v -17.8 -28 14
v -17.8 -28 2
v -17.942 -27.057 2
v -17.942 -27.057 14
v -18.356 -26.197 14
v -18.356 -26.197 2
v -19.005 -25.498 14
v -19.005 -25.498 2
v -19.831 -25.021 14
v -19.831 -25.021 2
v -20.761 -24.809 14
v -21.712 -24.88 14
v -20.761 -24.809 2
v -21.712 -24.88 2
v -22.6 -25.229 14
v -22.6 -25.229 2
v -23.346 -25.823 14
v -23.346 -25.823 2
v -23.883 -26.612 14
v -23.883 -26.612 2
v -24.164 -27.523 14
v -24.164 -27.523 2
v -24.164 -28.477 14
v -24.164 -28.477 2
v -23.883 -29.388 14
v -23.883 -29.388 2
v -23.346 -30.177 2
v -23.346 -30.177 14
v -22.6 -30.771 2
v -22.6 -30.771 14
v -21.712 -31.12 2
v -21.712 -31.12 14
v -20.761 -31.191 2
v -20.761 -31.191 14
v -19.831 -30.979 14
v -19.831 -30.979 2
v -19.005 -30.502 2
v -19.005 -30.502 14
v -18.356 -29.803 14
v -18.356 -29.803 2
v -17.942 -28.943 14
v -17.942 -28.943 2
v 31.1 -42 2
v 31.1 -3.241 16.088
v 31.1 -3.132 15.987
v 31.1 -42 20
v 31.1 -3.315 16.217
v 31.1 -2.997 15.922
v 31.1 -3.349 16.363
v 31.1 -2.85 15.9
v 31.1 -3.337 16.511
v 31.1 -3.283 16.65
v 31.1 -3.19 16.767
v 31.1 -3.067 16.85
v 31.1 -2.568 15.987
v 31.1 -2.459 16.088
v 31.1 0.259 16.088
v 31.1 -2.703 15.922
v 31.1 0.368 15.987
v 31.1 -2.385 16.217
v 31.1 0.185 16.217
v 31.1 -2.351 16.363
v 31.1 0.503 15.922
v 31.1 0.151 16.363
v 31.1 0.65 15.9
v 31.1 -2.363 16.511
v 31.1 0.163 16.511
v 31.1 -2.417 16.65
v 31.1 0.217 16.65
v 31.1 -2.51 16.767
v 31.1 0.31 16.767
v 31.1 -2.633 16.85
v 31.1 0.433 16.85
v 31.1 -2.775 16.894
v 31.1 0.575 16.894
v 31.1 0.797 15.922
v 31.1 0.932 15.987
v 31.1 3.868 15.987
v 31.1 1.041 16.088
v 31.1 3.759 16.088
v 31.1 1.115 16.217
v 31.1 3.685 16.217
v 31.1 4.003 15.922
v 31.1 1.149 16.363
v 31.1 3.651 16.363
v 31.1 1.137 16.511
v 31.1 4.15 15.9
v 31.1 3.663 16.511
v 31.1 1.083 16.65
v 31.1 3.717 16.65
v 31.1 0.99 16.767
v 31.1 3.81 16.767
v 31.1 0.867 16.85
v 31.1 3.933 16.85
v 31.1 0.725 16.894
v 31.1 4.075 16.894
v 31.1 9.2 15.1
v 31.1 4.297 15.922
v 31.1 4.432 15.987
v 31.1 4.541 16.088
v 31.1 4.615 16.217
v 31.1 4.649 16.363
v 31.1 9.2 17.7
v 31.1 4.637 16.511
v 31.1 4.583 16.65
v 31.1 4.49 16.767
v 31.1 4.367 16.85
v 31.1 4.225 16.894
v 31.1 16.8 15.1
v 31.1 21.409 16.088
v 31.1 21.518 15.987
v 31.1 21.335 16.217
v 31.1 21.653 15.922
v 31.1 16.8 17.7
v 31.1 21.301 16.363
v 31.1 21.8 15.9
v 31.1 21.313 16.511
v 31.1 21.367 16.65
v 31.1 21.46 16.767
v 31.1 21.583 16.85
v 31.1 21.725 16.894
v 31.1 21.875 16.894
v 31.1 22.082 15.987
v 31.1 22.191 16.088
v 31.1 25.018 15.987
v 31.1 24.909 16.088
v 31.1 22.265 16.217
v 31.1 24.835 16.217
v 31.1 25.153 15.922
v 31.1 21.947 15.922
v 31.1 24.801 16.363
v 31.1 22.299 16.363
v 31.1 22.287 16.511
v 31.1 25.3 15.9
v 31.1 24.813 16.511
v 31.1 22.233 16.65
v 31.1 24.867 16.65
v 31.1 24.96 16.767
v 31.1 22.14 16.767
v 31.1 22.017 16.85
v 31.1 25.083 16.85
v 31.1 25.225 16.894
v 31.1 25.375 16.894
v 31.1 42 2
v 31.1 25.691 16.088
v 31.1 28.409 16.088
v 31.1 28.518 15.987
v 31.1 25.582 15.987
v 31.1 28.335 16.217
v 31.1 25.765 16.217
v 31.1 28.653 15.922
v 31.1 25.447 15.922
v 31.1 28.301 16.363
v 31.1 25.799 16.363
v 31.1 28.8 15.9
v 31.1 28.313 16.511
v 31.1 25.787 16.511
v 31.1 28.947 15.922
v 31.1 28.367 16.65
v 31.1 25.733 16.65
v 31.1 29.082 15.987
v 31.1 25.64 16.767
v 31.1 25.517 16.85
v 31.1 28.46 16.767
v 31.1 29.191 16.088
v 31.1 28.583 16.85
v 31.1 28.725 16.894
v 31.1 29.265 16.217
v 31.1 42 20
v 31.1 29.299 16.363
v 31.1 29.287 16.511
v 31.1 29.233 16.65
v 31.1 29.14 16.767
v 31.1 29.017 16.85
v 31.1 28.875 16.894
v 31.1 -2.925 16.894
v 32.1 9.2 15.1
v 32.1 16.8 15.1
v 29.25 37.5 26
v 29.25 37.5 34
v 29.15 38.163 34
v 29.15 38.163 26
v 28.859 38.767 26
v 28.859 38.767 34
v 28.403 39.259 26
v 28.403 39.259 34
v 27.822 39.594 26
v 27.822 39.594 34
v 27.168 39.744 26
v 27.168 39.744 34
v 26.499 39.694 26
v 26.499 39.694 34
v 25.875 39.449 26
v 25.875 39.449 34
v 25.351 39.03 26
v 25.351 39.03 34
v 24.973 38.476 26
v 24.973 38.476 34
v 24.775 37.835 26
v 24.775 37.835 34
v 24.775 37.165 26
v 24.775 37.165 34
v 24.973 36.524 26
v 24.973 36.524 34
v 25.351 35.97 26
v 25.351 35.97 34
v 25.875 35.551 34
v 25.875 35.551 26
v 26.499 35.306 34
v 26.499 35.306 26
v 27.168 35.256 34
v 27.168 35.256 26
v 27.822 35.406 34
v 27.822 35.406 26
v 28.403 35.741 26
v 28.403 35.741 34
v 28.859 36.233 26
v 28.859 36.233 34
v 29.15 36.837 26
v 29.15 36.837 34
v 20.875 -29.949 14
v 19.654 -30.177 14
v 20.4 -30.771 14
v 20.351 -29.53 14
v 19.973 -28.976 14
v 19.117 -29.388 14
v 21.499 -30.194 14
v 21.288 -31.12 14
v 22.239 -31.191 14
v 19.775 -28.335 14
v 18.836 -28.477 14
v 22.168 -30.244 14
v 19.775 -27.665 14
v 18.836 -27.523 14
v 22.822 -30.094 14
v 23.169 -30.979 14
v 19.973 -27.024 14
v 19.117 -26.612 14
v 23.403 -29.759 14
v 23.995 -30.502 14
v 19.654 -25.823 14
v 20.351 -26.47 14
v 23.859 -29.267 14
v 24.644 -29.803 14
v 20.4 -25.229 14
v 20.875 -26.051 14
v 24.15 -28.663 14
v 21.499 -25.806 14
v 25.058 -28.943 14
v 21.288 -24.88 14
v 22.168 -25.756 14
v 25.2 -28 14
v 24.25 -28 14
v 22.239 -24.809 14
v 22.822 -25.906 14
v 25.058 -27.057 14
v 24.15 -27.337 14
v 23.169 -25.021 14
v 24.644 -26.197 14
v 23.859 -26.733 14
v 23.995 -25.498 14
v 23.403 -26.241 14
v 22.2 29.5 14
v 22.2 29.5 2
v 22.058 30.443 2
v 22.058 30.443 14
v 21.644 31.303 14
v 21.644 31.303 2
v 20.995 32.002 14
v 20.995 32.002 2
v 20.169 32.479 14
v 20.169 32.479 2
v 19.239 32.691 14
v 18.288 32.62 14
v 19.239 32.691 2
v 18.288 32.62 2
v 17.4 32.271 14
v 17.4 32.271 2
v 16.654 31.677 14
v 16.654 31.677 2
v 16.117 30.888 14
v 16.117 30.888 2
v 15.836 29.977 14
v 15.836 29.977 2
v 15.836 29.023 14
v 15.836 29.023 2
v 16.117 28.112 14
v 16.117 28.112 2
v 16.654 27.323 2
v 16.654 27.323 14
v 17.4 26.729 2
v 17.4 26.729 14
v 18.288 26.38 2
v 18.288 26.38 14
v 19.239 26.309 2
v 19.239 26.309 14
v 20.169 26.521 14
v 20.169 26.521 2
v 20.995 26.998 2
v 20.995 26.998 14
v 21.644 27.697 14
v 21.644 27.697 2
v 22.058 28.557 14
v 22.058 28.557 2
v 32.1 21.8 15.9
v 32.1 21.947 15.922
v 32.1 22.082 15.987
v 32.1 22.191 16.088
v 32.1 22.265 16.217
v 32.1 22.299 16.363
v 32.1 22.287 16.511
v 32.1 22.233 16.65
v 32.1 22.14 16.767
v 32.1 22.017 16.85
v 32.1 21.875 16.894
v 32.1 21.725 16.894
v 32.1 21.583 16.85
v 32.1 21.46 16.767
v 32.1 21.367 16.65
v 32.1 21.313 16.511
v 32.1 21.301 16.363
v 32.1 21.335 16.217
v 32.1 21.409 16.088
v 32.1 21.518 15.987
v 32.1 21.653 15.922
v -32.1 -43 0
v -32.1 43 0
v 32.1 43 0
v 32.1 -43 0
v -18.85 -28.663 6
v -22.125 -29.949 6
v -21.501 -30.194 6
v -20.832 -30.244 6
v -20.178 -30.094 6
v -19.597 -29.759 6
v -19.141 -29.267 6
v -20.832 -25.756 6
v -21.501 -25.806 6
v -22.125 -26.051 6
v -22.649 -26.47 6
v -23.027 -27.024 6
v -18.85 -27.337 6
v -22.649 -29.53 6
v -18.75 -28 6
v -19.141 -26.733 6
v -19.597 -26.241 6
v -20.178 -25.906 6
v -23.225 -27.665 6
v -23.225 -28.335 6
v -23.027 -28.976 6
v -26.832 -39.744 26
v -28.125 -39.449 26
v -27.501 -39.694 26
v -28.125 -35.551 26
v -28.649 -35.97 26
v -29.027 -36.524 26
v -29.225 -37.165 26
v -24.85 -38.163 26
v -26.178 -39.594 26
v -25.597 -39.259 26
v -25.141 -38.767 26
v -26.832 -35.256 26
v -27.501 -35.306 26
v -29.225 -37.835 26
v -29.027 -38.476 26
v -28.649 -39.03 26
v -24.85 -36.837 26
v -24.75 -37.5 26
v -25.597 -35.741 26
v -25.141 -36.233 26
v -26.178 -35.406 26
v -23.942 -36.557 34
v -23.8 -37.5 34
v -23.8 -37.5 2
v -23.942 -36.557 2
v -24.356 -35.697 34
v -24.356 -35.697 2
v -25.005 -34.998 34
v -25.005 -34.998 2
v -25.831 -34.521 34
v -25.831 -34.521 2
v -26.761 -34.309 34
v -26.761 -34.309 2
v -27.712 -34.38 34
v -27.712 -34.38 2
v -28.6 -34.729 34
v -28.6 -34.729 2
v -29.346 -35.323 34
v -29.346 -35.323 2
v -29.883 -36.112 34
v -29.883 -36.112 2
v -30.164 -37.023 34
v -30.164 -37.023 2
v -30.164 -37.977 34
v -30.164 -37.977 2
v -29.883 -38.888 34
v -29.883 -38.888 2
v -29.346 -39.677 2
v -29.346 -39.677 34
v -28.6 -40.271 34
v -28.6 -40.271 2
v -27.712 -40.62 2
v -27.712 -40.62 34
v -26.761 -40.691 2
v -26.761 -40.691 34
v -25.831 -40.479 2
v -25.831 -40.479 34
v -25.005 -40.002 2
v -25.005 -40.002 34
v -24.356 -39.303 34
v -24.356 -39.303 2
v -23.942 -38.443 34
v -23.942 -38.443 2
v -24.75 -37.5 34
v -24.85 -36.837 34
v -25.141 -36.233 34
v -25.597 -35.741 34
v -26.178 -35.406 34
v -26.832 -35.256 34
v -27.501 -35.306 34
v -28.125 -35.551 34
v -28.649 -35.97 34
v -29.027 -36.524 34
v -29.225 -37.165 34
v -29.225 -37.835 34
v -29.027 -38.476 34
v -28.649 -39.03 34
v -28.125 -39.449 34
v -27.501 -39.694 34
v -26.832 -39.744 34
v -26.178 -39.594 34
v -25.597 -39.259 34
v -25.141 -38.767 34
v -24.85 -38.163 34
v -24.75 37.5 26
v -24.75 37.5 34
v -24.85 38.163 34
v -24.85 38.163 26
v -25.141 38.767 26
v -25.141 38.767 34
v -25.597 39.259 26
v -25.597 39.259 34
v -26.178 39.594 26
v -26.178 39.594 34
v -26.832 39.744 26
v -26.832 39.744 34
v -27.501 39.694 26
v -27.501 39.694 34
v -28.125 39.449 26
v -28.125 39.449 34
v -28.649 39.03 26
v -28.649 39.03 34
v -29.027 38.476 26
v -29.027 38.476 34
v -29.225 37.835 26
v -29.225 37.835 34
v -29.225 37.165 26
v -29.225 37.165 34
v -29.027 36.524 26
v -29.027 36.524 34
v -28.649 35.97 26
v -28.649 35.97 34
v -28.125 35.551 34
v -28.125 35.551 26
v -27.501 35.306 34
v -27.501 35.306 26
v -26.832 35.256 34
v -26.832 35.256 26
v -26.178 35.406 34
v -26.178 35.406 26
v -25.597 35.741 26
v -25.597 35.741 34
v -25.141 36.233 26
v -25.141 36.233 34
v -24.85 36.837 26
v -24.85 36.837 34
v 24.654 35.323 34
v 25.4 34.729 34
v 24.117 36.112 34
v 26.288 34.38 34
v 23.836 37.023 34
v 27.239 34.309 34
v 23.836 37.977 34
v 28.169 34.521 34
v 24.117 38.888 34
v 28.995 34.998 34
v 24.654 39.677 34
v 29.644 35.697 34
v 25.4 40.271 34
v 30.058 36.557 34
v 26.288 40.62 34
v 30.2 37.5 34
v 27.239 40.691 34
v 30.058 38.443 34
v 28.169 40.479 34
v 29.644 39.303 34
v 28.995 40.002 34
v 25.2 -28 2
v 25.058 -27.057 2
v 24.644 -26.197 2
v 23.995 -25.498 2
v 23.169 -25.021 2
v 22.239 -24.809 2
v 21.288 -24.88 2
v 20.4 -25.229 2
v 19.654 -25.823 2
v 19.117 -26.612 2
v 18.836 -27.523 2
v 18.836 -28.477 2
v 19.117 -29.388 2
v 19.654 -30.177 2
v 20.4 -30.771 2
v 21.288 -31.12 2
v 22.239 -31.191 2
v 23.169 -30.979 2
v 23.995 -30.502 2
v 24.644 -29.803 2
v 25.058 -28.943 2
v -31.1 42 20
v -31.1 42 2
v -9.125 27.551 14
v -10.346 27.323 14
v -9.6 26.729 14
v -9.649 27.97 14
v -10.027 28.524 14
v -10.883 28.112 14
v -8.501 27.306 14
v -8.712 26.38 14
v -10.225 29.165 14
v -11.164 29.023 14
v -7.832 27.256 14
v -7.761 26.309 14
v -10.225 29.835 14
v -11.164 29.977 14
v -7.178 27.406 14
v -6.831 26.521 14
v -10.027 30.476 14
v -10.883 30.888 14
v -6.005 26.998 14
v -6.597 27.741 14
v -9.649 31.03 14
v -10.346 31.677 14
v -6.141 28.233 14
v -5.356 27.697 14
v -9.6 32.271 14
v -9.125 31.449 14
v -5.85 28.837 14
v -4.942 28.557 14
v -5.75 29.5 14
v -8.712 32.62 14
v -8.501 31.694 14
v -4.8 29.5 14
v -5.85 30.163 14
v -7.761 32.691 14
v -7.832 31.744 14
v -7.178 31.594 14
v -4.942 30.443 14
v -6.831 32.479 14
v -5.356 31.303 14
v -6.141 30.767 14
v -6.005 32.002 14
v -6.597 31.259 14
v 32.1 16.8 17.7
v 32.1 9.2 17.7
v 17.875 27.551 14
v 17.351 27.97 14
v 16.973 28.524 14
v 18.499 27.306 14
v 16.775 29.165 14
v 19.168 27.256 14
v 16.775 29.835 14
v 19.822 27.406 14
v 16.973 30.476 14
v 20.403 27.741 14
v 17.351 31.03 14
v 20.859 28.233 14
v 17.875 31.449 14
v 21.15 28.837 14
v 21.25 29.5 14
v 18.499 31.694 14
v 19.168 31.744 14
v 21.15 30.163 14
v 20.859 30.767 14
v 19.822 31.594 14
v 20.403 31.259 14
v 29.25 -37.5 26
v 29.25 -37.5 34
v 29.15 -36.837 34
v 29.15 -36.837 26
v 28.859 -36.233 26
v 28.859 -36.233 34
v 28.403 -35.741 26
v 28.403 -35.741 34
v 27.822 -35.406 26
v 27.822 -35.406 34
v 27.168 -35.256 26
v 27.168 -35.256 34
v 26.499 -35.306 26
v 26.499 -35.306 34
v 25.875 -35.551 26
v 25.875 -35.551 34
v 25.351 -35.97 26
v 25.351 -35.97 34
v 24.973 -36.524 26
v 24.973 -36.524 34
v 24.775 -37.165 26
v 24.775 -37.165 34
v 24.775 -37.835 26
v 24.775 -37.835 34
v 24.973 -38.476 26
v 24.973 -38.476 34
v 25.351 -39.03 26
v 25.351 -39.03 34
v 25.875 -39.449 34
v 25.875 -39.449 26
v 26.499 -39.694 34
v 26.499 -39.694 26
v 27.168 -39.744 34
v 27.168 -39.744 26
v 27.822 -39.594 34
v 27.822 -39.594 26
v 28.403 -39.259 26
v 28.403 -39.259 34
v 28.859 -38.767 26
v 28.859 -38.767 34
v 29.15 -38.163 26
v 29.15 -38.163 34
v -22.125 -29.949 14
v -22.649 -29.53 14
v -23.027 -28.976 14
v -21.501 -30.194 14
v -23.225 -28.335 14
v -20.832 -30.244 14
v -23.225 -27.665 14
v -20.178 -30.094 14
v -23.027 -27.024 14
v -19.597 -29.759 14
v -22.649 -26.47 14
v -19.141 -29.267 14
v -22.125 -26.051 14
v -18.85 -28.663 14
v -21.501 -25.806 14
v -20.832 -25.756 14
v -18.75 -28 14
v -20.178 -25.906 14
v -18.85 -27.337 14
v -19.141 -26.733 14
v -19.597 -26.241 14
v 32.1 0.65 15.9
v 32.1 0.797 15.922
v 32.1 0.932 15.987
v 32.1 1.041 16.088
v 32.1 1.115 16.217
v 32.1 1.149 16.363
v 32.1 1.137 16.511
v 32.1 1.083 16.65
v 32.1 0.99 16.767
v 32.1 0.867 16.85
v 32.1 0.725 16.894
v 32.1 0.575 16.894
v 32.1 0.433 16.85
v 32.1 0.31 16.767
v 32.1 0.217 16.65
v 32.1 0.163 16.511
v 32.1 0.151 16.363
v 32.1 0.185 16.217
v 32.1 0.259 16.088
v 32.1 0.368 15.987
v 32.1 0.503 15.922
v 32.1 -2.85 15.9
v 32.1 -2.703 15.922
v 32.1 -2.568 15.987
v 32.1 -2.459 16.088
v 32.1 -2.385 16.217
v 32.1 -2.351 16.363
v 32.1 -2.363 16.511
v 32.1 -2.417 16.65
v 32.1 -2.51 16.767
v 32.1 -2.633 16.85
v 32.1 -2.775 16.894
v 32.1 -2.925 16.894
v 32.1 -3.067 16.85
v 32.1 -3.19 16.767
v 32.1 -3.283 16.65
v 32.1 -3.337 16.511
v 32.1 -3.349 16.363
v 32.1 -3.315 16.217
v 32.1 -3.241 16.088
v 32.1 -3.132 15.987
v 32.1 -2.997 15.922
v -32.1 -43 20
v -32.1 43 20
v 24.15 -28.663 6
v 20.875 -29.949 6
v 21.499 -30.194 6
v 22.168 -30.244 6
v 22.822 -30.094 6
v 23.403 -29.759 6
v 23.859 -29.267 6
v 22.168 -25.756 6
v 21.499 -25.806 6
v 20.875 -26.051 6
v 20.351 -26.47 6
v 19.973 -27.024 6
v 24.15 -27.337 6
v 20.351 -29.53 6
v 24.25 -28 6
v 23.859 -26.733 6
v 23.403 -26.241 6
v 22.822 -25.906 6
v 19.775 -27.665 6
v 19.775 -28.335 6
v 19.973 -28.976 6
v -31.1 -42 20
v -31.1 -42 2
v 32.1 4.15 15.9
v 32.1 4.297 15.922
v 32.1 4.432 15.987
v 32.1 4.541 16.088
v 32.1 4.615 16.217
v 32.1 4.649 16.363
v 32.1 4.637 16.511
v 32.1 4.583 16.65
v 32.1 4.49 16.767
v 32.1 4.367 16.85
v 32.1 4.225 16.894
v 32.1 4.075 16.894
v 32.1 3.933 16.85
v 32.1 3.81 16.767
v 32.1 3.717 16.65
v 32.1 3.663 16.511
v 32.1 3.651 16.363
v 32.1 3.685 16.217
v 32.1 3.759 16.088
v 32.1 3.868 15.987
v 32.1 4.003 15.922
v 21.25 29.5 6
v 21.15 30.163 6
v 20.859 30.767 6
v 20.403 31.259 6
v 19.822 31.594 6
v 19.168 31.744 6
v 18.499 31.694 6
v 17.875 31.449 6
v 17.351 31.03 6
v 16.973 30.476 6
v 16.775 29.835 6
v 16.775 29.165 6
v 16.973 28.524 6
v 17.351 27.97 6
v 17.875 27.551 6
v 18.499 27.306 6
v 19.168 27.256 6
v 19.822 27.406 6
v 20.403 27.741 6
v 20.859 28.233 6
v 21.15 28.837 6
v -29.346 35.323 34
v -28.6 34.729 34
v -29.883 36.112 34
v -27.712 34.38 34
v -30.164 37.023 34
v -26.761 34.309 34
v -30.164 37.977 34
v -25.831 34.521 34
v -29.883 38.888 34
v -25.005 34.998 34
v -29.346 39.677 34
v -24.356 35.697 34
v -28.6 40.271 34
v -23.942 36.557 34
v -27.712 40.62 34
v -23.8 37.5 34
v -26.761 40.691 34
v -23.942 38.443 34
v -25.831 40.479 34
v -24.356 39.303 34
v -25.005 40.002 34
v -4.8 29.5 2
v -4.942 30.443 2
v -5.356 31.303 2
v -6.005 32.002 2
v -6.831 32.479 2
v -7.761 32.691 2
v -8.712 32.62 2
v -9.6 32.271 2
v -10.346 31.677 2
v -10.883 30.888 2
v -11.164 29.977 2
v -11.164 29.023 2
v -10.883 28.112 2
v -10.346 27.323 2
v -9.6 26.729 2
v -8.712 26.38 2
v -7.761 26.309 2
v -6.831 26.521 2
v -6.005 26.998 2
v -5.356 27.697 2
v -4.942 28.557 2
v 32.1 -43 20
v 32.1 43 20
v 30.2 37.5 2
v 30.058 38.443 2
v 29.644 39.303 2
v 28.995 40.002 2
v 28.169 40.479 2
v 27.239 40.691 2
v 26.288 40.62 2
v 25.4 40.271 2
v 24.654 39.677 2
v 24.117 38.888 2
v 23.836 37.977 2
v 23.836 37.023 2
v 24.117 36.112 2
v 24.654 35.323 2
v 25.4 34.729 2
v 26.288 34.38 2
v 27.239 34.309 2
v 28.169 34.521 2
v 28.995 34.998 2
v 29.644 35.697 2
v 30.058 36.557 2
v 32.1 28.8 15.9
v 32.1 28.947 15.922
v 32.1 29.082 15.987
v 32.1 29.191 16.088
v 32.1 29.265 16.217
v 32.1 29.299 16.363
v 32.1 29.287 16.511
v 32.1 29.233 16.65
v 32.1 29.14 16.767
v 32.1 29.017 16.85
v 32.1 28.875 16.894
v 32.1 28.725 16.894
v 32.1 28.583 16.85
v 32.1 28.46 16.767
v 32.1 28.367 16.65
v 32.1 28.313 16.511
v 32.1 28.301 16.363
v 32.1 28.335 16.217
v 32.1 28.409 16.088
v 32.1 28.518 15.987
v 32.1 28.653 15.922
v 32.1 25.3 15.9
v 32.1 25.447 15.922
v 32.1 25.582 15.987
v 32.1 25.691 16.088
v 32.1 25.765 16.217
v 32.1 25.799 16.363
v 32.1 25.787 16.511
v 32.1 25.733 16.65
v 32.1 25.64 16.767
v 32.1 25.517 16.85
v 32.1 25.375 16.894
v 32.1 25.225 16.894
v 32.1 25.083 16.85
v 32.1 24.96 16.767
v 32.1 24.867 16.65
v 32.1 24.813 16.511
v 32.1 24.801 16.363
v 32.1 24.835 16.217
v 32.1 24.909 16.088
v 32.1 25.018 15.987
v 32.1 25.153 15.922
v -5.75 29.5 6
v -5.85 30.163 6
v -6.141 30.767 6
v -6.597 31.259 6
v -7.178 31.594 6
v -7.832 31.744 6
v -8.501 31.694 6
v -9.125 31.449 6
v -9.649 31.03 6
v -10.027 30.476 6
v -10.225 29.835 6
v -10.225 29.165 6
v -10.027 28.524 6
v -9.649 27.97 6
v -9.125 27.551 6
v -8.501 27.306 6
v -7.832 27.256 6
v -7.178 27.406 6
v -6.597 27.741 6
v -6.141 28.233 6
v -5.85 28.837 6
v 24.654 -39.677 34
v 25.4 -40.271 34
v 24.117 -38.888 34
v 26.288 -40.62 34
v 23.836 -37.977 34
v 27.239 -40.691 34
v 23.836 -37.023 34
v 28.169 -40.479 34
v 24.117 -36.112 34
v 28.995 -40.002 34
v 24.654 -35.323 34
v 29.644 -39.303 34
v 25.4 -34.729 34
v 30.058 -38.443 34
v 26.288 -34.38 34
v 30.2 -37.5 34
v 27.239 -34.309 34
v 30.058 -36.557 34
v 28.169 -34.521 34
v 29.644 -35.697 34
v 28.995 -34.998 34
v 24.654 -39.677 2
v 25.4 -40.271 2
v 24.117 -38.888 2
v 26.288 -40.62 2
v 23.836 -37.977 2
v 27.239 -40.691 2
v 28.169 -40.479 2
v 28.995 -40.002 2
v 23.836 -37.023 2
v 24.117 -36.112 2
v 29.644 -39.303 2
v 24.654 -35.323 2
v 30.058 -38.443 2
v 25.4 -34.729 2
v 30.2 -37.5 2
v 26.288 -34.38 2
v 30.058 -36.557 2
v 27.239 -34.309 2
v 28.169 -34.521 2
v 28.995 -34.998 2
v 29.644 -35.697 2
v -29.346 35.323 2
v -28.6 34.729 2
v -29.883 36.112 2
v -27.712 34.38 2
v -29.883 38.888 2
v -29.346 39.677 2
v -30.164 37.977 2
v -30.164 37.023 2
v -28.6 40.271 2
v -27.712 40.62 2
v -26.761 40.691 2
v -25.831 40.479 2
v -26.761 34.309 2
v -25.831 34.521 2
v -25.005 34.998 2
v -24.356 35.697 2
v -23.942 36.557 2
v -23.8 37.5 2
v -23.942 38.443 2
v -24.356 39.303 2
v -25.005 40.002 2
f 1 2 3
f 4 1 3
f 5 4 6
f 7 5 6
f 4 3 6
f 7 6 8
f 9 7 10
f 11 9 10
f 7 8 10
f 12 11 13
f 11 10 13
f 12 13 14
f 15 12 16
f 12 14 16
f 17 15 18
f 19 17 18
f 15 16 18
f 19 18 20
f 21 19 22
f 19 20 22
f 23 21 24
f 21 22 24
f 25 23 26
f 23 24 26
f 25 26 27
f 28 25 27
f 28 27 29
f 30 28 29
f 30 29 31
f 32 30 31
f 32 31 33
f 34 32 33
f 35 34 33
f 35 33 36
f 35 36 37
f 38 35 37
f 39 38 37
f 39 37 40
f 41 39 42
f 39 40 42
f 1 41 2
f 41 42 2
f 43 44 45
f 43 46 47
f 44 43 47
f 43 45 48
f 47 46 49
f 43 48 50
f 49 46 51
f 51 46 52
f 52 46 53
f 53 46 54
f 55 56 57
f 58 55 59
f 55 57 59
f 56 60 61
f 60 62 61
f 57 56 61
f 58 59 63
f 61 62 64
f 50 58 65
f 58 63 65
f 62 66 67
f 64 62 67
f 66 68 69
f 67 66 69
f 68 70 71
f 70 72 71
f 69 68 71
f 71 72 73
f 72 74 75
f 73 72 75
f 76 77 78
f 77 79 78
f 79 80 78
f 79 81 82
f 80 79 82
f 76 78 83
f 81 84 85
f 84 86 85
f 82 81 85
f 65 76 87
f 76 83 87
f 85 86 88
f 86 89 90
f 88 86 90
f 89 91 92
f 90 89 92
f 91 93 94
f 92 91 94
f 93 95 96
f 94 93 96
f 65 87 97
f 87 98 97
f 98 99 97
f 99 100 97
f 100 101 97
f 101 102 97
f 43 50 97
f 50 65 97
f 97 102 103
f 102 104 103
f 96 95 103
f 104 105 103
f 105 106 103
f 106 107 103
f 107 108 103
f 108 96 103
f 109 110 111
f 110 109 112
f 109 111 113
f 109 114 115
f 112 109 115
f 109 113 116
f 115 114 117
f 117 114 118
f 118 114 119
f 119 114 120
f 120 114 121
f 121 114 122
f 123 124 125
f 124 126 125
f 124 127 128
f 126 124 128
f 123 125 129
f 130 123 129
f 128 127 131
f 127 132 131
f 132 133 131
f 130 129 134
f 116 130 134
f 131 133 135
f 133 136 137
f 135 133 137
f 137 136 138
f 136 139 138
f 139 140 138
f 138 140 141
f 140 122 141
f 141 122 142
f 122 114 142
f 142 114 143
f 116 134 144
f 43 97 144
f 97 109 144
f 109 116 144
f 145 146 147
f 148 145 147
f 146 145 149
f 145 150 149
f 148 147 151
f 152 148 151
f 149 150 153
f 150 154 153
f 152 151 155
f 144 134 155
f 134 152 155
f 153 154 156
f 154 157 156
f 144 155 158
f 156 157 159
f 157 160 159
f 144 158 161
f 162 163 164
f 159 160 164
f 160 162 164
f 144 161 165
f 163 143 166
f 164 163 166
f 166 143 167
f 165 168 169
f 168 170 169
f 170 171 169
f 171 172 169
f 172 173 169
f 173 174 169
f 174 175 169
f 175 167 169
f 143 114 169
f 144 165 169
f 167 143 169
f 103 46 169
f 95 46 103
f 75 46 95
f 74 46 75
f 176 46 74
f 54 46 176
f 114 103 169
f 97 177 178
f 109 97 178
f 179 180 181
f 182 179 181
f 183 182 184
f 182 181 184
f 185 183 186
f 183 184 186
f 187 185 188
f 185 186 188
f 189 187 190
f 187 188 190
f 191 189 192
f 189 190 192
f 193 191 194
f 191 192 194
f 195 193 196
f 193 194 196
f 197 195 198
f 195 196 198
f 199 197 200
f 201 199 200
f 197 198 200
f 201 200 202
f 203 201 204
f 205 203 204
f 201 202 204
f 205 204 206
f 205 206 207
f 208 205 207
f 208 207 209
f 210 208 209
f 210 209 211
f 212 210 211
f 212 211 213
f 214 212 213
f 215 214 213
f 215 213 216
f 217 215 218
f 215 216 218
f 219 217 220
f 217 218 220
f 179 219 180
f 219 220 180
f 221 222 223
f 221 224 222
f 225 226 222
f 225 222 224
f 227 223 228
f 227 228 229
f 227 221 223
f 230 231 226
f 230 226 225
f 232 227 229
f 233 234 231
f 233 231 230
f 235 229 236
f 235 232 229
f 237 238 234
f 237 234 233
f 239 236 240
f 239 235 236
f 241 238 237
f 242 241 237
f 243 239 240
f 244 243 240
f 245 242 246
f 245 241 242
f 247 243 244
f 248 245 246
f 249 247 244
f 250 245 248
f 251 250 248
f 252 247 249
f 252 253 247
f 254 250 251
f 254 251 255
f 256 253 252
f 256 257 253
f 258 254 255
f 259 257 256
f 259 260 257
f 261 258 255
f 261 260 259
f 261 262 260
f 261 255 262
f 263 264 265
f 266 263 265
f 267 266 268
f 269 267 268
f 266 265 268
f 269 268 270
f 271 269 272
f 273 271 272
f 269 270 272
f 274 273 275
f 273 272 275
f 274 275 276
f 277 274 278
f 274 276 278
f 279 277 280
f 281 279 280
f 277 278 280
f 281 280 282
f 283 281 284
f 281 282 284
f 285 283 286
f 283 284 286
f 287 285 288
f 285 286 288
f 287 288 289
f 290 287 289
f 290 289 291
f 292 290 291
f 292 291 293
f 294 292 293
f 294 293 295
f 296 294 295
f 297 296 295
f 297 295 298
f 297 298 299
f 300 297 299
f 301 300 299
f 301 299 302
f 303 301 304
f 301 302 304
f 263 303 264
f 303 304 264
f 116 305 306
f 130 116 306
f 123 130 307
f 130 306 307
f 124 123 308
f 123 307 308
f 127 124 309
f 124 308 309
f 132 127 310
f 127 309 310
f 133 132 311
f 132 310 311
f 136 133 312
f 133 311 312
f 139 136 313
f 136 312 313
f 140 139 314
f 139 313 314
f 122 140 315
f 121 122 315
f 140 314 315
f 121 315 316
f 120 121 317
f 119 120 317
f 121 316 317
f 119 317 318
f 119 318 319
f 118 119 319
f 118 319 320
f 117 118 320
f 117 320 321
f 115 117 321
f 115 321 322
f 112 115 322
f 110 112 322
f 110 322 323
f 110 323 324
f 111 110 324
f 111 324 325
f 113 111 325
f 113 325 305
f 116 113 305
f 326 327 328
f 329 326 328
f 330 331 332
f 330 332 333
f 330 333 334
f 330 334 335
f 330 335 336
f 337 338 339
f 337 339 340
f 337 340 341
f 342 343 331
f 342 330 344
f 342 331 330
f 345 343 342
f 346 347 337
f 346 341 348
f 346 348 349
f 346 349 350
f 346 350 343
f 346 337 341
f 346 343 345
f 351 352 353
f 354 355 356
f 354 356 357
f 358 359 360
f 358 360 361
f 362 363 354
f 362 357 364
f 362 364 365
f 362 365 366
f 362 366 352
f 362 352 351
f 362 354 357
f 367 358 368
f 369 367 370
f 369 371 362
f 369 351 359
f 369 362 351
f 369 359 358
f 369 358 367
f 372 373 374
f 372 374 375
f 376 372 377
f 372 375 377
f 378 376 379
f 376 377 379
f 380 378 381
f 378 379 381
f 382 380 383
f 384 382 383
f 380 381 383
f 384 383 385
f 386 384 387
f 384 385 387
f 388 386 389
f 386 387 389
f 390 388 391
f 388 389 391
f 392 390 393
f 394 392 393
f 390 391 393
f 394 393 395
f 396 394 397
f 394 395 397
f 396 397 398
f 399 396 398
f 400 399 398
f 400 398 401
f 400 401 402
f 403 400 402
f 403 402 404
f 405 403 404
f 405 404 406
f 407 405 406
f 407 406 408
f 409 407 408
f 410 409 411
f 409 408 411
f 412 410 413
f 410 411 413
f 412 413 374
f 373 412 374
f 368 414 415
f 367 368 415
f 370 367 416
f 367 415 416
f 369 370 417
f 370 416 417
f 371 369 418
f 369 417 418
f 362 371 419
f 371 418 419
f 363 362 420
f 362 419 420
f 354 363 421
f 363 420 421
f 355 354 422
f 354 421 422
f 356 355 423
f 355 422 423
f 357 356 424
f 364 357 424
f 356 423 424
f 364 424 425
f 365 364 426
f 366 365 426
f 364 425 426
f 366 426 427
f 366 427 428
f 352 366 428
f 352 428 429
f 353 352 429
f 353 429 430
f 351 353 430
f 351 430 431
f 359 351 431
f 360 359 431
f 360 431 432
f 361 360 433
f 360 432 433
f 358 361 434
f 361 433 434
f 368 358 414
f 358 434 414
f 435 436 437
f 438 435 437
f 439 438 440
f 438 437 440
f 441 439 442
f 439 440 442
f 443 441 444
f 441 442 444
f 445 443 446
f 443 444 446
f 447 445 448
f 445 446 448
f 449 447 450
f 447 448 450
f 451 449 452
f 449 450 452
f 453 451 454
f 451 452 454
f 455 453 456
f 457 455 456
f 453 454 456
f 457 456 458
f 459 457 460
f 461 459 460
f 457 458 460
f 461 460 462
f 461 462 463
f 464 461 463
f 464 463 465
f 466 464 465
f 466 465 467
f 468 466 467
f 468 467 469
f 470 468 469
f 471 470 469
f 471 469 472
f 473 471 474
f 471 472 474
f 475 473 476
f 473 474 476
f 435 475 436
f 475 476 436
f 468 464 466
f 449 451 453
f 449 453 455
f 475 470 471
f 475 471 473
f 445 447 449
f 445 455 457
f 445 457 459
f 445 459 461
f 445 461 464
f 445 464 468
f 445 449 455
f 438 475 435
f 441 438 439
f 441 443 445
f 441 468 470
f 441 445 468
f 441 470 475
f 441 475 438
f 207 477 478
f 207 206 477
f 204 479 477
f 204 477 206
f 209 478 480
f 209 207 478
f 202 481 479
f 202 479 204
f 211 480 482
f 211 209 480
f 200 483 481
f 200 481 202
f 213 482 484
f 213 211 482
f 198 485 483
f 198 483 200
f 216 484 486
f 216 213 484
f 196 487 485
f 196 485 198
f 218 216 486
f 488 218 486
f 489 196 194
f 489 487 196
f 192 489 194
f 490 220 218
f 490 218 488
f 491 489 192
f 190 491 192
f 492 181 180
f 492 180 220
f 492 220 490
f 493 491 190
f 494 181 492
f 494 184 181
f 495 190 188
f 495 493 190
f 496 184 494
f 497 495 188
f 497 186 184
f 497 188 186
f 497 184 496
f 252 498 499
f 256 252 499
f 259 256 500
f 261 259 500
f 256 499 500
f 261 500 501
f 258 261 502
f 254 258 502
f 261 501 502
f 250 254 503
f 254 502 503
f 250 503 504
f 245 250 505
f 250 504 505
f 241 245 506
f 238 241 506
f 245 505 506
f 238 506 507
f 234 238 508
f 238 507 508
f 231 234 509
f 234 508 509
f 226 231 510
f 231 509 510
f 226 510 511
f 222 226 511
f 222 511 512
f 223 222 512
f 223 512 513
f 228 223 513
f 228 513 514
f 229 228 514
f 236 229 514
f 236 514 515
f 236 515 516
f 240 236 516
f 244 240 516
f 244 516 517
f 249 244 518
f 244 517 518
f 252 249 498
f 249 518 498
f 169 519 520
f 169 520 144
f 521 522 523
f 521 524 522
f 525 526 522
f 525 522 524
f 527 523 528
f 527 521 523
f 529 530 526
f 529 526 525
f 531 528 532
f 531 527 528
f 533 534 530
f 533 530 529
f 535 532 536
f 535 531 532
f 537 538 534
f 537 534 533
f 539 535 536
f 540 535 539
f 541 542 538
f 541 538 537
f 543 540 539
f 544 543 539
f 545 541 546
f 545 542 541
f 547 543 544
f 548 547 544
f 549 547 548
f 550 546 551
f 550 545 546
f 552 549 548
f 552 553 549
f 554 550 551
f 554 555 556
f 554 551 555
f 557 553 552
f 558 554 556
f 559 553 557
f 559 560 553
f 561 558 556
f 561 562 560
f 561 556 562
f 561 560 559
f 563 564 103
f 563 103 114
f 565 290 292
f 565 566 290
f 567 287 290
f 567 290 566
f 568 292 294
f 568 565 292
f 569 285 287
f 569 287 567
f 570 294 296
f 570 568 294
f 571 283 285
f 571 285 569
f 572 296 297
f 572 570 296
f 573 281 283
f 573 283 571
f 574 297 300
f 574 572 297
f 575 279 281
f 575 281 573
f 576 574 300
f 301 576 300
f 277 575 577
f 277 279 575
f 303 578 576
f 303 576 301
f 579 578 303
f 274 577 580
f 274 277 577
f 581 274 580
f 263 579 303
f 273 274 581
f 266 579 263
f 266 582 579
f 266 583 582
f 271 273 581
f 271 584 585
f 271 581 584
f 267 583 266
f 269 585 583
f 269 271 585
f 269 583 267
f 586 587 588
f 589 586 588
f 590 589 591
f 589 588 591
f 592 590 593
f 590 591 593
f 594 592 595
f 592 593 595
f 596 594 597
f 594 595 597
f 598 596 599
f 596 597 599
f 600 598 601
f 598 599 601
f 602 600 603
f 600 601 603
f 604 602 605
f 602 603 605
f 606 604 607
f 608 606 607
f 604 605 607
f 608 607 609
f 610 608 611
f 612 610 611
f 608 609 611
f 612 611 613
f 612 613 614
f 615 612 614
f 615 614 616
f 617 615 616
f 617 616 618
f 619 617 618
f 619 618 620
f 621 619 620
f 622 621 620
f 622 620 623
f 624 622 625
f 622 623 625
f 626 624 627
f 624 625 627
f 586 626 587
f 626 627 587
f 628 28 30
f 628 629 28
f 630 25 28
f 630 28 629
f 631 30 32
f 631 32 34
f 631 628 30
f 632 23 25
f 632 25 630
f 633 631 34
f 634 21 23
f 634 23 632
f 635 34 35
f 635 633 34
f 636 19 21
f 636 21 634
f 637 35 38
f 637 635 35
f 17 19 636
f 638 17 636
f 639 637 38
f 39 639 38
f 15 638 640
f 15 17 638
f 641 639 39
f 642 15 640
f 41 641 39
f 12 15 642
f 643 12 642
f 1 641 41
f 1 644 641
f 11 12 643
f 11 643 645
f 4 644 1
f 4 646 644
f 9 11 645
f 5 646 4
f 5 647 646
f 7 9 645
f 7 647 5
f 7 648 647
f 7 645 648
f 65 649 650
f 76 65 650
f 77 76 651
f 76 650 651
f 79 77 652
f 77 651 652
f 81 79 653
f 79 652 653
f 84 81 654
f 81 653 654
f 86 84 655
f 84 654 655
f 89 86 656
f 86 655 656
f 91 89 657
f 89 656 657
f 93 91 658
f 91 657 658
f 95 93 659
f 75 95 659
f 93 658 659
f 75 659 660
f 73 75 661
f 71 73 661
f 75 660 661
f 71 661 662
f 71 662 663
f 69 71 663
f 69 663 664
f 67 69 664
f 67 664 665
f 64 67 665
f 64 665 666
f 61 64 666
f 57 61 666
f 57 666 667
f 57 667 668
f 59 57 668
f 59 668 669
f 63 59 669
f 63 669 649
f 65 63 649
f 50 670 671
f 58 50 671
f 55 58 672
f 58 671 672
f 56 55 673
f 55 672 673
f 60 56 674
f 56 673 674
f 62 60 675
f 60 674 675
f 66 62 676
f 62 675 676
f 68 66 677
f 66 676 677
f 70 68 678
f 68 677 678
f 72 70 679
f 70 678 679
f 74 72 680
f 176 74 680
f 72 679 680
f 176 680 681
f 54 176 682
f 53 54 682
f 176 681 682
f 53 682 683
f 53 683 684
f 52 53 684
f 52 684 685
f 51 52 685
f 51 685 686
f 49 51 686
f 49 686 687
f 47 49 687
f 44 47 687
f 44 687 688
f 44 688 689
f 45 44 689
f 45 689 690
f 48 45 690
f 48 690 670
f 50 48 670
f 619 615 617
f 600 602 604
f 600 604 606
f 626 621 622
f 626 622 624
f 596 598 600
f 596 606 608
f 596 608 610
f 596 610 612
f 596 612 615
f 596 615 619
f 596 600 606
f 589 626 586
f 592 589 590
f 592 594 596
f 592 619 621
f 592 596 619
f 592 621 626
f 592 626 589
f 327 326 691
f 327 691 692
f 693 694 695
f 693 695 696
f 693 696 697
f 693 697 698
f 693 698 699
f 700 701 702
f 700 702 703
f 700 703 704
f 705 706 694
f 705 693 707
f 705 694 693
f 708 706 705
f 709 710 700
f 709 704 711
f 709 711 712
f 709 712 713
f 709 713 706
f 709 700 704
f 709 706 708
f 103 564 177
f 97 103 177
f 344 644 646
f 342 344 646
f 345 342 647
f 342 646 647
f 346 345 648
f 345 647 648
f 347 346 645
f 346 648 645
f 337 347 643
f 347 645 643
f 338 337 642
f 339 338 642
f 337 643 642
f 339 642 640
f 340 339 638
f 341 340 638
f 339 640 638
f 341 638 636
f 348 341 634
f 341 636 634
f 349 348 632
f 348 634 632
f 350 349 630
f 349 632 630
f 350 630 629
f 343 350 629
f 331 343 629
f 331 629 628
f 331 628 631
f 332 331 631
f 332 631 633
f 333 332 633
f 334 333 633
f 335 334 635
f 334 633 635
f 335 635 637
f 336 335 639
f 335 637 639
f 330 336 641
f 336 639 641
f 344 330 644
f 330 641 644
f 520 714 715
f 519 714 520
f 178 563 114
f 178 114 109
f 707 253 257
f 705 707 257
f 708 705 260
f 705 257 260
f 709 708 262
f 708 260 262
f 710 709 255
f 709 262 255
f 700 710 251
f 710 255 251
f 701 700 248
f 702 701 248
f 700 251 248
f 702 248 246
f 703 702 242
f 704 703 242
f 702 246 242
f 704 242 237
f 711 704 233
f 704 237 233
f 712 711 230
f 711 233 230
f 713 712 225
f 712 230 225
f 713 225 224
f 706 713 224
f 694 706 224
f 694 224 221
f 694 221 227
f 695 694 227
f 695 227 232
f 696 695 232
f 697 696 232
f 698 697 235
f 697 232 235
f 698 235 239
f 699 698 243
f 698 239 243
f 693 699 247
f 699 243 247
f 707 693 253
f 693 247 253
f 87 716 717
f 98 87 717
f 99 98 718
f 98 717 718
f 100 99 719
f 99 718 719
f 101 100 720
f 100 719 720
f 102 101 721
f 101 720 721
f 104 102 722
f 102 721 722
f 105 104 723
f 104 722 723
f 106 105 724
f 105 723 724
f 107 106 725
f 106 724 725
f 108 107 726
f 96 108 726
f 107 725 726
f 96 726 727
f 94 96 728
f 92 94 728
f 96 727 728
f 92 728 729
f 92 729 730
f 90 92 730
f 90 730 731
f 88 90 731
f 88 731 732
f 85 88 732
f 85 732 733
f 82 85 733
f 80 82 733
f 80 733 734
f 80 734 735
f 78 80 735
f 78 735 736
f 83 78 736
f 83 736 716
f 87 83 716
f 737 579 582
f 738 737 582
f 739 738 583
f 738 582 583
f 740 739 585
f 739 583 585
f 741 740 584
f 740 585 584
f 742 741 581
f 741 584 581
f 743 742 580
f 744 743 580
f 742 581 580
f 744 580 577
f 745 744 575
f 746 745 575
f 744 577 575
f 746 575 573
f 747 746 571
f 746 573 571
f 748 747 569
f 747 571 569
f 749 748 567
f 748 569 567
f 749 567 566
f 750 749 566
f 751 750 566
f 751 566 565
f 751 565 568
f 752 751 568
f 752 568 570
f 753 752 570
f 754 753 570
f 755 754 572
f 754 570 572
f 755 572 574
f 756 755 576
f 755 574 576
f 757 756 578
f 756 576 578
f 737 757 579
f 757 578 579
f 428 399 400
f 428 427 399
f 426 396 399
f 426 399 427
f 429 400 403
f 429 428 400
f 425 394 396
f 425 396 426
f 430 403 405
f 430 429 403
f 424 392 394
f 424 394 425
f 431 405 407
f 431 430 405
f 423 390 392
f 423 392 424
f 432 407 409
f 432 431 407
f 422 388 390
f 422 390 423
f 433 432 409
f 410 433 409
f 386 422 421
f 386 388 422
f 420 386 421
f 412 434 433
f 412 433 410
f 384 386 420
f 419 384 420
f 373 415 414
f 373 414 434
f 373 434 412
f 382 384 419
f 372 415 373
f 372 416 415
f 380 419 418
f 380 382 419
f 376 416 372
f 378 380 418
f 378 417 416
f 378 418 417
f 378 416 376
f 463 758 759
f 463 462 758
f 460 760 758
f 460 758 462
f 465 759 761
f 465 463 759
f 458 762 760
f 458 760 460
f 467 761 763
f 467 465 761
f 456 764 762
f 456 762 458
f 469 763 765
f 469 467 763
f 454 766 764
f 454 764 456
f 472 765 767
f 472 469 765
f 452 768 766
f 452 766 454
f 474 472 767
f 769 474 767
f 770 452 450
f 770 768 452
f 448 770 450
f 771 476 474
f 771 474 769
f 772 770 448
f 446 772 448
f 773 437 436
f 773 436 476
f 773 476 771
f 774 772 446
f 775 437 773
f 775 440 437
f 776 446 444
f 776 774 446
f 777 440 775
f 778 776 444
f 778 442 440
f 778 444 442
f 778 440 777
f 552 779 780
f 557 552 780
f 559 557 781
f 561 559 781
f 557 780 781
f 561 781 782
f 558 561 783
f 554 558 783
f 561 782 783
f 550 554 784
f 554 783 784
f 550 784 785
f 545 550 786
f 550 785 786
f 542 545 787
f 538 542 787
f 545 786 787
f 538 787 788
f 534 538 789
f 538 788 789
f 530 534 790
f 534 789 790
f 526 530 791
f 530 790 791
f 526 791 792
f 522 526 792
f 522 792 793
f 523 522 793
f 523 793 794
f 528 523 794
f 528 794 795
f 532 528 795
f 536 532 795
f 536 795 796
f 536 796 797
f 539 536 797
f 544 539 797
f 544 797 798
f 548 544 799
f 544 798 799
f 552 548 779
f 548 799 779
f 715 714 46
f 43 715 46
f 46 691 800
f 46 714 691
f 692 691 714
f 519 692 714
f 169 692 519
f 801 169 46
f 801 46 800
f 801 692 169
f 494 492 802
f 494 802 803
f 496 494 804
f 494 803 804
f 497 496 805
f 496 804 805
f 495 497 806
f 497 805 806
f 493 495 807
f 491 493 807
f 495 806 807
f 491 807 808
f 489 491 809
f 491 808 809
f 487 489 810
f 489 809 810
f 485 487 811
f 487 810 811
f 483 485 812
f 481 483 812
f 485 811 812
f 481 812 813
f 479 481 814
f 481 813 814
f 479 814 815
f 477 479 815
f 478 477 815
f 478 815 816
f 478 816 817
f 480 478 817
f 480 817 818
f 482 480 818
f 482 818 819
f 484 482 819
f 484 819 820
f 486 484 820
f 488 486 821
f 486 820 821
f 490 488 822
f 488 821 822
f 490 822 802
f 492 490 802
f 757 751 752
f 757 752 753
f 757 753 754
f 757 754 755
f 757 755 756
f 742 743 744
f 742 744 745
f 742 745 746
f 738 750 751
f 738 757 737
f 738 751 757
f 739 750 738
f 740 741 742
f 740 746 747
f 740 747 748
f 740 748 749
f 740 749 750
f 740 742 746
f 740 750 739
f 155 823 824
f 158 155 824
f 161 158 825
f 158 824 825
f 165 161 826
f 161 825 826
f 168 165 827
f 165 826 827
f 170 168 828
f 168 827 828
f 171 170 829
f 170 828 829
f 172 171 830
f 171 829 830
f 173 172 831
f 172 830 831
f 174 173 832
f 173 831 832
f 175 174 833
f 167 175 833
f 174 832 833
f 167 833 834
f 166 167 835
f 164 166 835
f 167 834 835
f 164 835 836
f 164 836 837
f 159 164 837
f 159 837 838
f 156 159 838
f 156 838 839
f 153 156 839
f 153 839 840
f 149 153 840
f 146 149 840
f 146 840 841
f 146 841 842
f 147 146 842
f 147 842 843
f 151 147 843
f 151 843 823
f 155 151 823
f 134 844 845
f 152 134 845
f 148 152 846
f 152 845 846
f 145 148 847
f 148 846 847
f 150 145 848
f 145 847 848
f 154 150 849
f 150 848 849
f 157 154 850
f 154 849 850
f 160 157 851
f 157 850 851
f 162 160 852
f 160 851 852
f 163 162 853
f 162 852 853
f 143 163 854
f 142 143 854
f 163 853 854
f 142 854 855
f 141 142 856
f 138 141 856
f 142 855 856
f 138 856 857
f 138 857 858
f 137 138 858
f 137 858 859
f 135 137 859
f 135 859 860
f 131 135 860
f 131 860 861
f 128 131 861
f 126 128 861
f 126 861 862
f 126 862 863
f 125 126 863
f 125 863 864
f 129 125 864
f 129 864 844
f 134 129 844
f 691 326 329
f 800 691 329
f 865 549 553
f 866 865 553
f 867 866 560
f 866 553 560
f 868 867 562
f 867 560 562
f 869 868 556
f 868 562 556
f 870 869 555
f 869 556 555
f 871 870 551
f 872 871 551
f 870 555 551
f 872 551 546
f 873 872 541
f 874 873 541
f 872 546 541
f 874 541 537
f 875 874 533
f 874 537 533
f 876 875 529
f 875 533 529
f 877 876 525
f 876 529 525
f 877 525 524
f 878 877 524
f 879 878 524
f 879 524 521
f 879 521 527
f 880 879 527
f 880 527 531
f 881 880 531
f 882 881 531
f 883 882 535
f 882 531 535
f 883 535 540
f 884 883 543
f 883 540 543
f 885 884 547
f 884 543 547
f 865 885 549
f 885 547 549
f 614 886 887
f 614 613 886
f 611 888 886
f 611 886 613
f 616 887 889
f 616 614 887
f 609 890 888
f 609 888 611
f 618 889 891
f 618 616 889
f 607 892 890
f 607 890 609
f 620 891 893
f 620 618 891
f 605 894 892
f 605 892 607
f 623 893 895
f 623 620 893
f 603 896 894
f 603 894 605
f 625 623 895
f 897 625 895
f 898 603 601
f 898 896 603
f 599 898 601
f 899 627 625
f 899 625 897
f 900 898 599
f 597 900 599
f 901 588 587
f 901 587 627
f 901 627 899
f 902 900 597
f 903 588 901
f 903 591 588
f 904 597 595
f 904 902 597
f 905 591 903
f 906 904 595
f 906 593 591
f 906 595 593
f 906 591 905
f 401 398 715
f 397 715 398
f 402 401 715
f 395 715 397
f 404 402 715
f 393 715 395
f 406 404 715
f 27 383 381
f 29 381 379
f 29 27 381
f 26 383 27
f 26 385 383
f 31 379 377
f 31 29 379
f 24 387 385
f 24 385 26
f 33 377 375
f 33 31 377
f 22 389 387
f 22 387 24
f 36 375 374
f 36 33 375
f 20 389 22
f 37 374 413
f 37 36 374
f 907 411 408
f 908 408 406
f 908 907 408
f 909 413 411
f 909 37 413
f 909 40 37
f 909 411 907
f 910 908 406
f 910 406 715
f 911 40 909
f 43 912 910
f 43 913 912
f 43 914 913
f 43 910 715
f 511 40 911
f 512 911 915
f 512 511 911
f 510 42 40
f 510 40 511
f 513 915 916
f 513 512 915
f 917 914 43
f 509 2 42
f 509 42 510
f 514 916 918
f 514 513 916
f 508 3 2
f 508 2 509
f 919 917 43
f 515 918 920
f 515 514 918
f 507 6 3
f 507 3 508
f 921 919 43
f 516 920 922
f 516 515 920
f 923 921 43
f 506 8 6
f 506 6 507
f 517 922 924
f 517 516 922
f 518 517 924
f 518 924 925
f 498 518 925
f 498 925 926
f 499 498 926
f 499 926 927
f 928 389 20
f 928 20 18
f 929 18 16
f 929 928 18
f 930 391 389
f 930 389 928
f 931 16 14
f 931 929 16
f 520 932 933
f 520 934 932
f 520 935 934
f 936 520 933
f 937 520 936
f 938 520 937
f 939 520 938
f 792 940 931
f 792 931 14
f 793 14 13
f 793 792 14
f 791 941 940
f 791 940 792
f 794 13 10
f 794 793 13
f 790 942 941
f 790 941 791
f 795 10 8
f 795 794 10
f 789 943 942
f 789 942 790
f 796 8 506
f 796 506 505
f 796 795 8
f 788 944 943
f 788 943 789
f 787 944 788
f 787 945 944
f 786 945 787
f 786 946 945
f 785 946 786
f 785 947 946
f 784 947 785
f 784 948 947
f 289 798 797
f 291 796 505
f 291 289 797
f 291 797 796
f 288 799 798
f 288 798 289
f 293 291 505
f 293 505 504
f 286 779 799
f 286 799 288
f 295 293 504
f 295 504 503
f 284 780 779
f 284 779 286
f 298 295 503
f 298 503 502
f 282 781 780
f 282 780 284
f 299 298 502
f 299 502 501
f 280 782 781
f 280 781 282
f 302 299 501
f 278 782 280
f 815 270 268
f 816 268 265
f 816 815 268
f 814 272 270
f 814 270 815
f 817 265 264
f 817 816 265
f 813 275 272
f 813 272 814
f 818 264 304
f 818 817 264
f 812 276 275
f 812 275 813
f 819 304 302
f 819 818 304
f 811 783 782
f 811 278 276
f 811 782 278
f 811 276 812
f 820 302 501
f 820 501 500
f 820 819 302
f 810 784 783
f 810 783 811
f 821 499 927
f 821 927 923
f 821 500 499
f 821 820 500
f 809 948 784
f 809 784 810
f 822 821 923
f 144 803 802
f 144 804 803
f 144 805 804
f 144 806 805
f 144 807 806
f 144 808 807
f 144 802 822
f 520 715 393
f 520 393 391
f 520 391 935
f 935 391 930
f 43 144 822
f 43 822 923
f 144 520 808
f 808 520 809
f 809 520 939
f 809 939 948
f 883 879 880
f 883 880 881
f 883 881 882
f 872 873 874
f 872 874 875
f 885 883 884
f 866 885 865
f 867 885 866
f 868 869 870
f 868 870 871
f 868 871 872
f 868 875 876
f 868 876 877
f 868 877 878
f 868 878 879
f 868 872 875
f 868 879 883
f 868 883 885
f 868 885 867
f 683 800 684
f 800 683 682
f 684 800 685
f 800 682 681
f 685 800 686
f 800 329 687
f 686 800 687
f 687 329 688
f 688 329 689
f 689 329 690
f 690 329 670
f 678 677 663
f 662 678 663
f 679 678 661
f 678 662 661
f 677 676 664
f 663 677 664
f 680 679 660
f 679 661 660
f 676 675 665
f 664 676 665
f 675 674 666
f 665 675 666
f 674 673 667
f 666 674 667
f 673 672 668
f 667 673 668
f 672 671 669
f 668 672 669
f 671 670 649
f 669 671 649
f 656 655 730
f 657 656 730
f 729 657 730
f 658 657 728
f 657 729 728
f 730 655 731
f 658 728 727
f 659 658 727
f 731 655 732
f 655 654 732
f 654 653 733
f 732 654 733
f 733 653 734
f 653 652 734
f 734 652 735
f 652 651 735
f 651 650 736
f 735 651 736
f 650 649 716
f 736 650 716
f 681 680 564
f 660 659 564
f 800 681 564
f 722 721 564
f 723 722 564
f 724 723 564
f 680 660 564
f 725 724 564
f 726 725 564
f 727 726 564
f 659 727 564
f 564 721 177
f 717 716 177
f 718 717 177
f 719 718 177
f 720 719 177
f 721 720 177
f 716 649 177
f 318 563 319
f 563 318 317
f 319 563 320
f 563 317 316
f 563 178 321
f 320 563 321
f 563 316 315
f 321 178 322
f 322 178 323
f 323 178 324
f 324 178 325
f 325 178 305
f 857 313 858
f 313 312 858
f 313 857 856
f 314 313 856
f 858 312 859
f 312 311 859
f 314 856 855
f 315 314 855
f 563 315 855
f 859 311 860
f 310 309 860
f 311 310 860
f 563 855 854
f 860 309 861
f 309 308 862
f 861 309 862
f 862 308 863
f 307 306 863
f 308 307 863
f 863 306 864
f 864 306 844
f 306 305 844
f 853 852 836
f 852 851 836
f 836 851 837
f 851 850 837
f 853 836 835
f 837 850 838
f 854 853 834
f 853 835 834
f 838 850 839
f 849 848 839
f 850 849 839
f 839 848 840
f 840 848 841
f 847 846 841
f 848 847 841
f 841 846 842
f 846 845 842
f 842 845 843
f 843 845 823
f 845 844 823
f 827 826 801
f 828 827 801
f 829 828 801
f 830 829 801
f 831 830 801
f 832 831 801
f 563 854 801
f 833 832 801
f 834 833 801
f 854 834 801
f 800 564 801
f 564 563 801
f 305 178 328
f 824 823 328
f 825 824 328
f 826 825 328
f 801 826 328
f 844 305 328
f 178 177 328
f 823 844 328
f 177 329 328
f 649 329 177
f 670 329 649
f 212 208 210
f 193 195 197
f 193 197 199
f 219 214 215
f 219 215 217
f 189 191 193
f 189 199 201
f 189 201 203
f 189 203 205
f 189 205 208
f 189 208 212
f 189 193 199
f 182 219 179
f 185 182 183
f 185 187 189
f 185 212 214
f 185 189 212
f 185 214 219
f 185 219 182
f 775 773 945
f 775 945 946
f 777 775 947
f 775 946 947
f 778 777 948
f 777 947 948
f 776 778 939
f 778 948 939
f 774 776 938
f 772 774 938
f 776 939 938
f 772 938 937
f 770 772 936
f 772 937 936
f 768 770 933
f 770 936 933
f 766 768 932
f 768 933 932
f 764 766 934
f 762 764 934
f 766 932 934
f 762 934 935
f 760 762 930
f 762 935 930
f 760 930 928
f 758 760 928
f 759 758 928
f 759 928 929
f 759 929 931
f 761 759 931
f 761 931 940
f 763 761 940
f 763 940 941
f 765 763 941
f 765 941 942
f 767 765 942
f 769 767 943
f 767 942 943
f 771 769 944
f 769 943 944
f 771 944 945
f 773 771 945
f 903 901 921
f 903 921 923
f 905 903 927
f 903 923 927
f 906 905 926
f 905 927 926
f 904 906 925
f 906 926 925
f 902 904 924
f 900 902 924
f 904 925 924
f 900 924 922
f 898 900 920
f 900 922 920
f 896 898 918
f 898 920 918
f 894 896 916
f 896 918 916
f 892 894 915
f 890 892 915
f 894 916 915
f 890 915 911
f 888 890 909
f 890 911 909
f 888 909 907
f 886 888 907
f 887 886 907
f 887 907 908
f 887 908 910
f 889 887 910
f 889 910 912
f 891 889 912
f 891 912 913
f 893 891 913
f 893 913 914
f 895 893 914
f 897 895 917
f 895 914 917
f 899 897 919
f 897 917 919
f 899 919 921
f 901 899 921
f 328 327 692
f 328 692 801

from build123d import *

# Parameters (mm, degrees)
SKETCH_1_W          = 64.2
SKETCH_1_H          = 86
EXTRUDE_1_DEPTH     = 20
SKETCH_2_W          = 62.2
SKETCH_2_H          = 84
CUT_EXTRUDE_1_DEPTH = 18
SKETCH_3_R          = 3.2
EXTRUDE_2_DEPTH     = 12
SKETCH_6_R          = 2.25
CUT_EXTRUDE_4_DEPTH = 8
SKETCH_7_R          = 3.2
EXTRUDE_3_DEPTH     = 32
SKETCH_8_R          = 2.25
CUT_EXTRUDE_5_DEPTH = 8
SKETCH_11_R         = 0.5
SKETCH_11_W         = 2.6
SKETCH_11_H         = 7.6
CUT_EXTRUDE_6_DEPTH = 2


with BuildPart() as part:
    # Эскиз1 → Бобышка-Вытянуть1 (new body)
    with BuildSketch(Plane.XY):
        Rectangle(SKETCH_1_W, SKETCH_1_H)
    extrude(amount=EXTRUDE_1_DEPTH)

    # Эскиз2 → Вырез-Вытянуть1 (cut)
    with BuildSketch(Plane.XY.offset(20)):
        Rectangle(SKETCH_2_W, SKETCH_2_H)
    extrude(amount=-CUT_EXTRUDE_1_DEPTH, mode=Mode.SUBTRACT)

    # Эскиз3 → Бобышка-Вытянуть2 (add)
    with BuildSketch(Plane.XY.offset(2)):
        with Locations((-21, -28)):
            Circle(SKETCH_3_R)
        with Locations((22, -28)):
            Circle(SKETCH_3_R)
        with Locations((19, 29.5)):
            Circle(SKETCH_3_R)
        with Locations((-8, 29.5)):
            Circle(SKETCH_3_R)
    extrude(amount=EXTRUDE_2_DEPTH)

    # Эскиз6 → Вырез-Вытянуть4 (cut)
    with BuildSketch(Plane.XY.offset(14)):
        with Locations((-21, -28)):
            Circle(SKETCH_6_R)
        with Locations((-8, 29.5)):
            Circle(SKETCH_6_R)
        with Locations((19, 29.5)):
            Circle(SKETCH_6_R)
        with Locations((22, -28)):
            Circle(SKETCH_6_R)
    extrude(amount=-CUT_EXTRUDE_4_DEPTH, mode=Mode.SUBTRACT)

    # Эскиз7 → Бобышка-Вытянуть3 (add)
    with BuildSketch(Plane.XY.offset(2)):
        with Locations((-27, -37.5)):
            Circle(SKETCH_7_R)
        with Locations((27, -37.5)):
            Circle(SKETCH_7_R)
        with Locations((-27, 37.5)):
            Circle(SKETCH_7_R)
        with Locations((27, 37.5)):
            Circle(SKETCH_7_R)
    extrude(amount=EXTRUDE_3_DEPTH)

    # Эскиз8 → Вырез-Вытянуть5 (cut)
    with BuildSketch(Plane.XY.offset(34)):
        with Locations((-27, 37.5)):
            Circle(SKETCH_8_R)
        with Locations((27, 37.5)):
            Circle(SKETCH_8_R)
        with Locations((27, -37.5)):
            Circle(SKETCH_8_R)
        with Locations((-27, -37.5)):
            Circle(SKETCH_8_R)
    extrude(amount=-CUT_EXTRUDE_5_DEPTH, mode=Mode.SUBTRACT)

    # Эскиз11 → Вырез-Вытянуть6 (cut)
    with BuildSketch(Plane(origin=(32.1, 0, 0), x_dir=(0, 0, -1), z_dir=(1, 0, 0))):
        with Locations((-16.4, 21.8)):
            Circle(SKETCH_11_R)
        with Locations((-16.4, 25.3)):
            Circle(SKETCH_11_R)
        with Locations((-16.4, 28.8)):
            Circle(SKETCH_11_R)
        with Locations((-16.4, 0.65)):
            Circle(SKETCH_11_R)
        with Locations((-16.4, 4.15)):
            Circle(SKETCH_11_R)
        with Locations((-16.4, -2.85)):
            Circle(SKETCH_11_R)
        with Locations((-16.4, 13)):
            Rectangle(SKETCH_11_W, SKETCH_11_H)
    extrude(amount=-CUT_EXTRUDE_6_DEPTH, mode=Mode.SUBTRACT)


solid = part.part
